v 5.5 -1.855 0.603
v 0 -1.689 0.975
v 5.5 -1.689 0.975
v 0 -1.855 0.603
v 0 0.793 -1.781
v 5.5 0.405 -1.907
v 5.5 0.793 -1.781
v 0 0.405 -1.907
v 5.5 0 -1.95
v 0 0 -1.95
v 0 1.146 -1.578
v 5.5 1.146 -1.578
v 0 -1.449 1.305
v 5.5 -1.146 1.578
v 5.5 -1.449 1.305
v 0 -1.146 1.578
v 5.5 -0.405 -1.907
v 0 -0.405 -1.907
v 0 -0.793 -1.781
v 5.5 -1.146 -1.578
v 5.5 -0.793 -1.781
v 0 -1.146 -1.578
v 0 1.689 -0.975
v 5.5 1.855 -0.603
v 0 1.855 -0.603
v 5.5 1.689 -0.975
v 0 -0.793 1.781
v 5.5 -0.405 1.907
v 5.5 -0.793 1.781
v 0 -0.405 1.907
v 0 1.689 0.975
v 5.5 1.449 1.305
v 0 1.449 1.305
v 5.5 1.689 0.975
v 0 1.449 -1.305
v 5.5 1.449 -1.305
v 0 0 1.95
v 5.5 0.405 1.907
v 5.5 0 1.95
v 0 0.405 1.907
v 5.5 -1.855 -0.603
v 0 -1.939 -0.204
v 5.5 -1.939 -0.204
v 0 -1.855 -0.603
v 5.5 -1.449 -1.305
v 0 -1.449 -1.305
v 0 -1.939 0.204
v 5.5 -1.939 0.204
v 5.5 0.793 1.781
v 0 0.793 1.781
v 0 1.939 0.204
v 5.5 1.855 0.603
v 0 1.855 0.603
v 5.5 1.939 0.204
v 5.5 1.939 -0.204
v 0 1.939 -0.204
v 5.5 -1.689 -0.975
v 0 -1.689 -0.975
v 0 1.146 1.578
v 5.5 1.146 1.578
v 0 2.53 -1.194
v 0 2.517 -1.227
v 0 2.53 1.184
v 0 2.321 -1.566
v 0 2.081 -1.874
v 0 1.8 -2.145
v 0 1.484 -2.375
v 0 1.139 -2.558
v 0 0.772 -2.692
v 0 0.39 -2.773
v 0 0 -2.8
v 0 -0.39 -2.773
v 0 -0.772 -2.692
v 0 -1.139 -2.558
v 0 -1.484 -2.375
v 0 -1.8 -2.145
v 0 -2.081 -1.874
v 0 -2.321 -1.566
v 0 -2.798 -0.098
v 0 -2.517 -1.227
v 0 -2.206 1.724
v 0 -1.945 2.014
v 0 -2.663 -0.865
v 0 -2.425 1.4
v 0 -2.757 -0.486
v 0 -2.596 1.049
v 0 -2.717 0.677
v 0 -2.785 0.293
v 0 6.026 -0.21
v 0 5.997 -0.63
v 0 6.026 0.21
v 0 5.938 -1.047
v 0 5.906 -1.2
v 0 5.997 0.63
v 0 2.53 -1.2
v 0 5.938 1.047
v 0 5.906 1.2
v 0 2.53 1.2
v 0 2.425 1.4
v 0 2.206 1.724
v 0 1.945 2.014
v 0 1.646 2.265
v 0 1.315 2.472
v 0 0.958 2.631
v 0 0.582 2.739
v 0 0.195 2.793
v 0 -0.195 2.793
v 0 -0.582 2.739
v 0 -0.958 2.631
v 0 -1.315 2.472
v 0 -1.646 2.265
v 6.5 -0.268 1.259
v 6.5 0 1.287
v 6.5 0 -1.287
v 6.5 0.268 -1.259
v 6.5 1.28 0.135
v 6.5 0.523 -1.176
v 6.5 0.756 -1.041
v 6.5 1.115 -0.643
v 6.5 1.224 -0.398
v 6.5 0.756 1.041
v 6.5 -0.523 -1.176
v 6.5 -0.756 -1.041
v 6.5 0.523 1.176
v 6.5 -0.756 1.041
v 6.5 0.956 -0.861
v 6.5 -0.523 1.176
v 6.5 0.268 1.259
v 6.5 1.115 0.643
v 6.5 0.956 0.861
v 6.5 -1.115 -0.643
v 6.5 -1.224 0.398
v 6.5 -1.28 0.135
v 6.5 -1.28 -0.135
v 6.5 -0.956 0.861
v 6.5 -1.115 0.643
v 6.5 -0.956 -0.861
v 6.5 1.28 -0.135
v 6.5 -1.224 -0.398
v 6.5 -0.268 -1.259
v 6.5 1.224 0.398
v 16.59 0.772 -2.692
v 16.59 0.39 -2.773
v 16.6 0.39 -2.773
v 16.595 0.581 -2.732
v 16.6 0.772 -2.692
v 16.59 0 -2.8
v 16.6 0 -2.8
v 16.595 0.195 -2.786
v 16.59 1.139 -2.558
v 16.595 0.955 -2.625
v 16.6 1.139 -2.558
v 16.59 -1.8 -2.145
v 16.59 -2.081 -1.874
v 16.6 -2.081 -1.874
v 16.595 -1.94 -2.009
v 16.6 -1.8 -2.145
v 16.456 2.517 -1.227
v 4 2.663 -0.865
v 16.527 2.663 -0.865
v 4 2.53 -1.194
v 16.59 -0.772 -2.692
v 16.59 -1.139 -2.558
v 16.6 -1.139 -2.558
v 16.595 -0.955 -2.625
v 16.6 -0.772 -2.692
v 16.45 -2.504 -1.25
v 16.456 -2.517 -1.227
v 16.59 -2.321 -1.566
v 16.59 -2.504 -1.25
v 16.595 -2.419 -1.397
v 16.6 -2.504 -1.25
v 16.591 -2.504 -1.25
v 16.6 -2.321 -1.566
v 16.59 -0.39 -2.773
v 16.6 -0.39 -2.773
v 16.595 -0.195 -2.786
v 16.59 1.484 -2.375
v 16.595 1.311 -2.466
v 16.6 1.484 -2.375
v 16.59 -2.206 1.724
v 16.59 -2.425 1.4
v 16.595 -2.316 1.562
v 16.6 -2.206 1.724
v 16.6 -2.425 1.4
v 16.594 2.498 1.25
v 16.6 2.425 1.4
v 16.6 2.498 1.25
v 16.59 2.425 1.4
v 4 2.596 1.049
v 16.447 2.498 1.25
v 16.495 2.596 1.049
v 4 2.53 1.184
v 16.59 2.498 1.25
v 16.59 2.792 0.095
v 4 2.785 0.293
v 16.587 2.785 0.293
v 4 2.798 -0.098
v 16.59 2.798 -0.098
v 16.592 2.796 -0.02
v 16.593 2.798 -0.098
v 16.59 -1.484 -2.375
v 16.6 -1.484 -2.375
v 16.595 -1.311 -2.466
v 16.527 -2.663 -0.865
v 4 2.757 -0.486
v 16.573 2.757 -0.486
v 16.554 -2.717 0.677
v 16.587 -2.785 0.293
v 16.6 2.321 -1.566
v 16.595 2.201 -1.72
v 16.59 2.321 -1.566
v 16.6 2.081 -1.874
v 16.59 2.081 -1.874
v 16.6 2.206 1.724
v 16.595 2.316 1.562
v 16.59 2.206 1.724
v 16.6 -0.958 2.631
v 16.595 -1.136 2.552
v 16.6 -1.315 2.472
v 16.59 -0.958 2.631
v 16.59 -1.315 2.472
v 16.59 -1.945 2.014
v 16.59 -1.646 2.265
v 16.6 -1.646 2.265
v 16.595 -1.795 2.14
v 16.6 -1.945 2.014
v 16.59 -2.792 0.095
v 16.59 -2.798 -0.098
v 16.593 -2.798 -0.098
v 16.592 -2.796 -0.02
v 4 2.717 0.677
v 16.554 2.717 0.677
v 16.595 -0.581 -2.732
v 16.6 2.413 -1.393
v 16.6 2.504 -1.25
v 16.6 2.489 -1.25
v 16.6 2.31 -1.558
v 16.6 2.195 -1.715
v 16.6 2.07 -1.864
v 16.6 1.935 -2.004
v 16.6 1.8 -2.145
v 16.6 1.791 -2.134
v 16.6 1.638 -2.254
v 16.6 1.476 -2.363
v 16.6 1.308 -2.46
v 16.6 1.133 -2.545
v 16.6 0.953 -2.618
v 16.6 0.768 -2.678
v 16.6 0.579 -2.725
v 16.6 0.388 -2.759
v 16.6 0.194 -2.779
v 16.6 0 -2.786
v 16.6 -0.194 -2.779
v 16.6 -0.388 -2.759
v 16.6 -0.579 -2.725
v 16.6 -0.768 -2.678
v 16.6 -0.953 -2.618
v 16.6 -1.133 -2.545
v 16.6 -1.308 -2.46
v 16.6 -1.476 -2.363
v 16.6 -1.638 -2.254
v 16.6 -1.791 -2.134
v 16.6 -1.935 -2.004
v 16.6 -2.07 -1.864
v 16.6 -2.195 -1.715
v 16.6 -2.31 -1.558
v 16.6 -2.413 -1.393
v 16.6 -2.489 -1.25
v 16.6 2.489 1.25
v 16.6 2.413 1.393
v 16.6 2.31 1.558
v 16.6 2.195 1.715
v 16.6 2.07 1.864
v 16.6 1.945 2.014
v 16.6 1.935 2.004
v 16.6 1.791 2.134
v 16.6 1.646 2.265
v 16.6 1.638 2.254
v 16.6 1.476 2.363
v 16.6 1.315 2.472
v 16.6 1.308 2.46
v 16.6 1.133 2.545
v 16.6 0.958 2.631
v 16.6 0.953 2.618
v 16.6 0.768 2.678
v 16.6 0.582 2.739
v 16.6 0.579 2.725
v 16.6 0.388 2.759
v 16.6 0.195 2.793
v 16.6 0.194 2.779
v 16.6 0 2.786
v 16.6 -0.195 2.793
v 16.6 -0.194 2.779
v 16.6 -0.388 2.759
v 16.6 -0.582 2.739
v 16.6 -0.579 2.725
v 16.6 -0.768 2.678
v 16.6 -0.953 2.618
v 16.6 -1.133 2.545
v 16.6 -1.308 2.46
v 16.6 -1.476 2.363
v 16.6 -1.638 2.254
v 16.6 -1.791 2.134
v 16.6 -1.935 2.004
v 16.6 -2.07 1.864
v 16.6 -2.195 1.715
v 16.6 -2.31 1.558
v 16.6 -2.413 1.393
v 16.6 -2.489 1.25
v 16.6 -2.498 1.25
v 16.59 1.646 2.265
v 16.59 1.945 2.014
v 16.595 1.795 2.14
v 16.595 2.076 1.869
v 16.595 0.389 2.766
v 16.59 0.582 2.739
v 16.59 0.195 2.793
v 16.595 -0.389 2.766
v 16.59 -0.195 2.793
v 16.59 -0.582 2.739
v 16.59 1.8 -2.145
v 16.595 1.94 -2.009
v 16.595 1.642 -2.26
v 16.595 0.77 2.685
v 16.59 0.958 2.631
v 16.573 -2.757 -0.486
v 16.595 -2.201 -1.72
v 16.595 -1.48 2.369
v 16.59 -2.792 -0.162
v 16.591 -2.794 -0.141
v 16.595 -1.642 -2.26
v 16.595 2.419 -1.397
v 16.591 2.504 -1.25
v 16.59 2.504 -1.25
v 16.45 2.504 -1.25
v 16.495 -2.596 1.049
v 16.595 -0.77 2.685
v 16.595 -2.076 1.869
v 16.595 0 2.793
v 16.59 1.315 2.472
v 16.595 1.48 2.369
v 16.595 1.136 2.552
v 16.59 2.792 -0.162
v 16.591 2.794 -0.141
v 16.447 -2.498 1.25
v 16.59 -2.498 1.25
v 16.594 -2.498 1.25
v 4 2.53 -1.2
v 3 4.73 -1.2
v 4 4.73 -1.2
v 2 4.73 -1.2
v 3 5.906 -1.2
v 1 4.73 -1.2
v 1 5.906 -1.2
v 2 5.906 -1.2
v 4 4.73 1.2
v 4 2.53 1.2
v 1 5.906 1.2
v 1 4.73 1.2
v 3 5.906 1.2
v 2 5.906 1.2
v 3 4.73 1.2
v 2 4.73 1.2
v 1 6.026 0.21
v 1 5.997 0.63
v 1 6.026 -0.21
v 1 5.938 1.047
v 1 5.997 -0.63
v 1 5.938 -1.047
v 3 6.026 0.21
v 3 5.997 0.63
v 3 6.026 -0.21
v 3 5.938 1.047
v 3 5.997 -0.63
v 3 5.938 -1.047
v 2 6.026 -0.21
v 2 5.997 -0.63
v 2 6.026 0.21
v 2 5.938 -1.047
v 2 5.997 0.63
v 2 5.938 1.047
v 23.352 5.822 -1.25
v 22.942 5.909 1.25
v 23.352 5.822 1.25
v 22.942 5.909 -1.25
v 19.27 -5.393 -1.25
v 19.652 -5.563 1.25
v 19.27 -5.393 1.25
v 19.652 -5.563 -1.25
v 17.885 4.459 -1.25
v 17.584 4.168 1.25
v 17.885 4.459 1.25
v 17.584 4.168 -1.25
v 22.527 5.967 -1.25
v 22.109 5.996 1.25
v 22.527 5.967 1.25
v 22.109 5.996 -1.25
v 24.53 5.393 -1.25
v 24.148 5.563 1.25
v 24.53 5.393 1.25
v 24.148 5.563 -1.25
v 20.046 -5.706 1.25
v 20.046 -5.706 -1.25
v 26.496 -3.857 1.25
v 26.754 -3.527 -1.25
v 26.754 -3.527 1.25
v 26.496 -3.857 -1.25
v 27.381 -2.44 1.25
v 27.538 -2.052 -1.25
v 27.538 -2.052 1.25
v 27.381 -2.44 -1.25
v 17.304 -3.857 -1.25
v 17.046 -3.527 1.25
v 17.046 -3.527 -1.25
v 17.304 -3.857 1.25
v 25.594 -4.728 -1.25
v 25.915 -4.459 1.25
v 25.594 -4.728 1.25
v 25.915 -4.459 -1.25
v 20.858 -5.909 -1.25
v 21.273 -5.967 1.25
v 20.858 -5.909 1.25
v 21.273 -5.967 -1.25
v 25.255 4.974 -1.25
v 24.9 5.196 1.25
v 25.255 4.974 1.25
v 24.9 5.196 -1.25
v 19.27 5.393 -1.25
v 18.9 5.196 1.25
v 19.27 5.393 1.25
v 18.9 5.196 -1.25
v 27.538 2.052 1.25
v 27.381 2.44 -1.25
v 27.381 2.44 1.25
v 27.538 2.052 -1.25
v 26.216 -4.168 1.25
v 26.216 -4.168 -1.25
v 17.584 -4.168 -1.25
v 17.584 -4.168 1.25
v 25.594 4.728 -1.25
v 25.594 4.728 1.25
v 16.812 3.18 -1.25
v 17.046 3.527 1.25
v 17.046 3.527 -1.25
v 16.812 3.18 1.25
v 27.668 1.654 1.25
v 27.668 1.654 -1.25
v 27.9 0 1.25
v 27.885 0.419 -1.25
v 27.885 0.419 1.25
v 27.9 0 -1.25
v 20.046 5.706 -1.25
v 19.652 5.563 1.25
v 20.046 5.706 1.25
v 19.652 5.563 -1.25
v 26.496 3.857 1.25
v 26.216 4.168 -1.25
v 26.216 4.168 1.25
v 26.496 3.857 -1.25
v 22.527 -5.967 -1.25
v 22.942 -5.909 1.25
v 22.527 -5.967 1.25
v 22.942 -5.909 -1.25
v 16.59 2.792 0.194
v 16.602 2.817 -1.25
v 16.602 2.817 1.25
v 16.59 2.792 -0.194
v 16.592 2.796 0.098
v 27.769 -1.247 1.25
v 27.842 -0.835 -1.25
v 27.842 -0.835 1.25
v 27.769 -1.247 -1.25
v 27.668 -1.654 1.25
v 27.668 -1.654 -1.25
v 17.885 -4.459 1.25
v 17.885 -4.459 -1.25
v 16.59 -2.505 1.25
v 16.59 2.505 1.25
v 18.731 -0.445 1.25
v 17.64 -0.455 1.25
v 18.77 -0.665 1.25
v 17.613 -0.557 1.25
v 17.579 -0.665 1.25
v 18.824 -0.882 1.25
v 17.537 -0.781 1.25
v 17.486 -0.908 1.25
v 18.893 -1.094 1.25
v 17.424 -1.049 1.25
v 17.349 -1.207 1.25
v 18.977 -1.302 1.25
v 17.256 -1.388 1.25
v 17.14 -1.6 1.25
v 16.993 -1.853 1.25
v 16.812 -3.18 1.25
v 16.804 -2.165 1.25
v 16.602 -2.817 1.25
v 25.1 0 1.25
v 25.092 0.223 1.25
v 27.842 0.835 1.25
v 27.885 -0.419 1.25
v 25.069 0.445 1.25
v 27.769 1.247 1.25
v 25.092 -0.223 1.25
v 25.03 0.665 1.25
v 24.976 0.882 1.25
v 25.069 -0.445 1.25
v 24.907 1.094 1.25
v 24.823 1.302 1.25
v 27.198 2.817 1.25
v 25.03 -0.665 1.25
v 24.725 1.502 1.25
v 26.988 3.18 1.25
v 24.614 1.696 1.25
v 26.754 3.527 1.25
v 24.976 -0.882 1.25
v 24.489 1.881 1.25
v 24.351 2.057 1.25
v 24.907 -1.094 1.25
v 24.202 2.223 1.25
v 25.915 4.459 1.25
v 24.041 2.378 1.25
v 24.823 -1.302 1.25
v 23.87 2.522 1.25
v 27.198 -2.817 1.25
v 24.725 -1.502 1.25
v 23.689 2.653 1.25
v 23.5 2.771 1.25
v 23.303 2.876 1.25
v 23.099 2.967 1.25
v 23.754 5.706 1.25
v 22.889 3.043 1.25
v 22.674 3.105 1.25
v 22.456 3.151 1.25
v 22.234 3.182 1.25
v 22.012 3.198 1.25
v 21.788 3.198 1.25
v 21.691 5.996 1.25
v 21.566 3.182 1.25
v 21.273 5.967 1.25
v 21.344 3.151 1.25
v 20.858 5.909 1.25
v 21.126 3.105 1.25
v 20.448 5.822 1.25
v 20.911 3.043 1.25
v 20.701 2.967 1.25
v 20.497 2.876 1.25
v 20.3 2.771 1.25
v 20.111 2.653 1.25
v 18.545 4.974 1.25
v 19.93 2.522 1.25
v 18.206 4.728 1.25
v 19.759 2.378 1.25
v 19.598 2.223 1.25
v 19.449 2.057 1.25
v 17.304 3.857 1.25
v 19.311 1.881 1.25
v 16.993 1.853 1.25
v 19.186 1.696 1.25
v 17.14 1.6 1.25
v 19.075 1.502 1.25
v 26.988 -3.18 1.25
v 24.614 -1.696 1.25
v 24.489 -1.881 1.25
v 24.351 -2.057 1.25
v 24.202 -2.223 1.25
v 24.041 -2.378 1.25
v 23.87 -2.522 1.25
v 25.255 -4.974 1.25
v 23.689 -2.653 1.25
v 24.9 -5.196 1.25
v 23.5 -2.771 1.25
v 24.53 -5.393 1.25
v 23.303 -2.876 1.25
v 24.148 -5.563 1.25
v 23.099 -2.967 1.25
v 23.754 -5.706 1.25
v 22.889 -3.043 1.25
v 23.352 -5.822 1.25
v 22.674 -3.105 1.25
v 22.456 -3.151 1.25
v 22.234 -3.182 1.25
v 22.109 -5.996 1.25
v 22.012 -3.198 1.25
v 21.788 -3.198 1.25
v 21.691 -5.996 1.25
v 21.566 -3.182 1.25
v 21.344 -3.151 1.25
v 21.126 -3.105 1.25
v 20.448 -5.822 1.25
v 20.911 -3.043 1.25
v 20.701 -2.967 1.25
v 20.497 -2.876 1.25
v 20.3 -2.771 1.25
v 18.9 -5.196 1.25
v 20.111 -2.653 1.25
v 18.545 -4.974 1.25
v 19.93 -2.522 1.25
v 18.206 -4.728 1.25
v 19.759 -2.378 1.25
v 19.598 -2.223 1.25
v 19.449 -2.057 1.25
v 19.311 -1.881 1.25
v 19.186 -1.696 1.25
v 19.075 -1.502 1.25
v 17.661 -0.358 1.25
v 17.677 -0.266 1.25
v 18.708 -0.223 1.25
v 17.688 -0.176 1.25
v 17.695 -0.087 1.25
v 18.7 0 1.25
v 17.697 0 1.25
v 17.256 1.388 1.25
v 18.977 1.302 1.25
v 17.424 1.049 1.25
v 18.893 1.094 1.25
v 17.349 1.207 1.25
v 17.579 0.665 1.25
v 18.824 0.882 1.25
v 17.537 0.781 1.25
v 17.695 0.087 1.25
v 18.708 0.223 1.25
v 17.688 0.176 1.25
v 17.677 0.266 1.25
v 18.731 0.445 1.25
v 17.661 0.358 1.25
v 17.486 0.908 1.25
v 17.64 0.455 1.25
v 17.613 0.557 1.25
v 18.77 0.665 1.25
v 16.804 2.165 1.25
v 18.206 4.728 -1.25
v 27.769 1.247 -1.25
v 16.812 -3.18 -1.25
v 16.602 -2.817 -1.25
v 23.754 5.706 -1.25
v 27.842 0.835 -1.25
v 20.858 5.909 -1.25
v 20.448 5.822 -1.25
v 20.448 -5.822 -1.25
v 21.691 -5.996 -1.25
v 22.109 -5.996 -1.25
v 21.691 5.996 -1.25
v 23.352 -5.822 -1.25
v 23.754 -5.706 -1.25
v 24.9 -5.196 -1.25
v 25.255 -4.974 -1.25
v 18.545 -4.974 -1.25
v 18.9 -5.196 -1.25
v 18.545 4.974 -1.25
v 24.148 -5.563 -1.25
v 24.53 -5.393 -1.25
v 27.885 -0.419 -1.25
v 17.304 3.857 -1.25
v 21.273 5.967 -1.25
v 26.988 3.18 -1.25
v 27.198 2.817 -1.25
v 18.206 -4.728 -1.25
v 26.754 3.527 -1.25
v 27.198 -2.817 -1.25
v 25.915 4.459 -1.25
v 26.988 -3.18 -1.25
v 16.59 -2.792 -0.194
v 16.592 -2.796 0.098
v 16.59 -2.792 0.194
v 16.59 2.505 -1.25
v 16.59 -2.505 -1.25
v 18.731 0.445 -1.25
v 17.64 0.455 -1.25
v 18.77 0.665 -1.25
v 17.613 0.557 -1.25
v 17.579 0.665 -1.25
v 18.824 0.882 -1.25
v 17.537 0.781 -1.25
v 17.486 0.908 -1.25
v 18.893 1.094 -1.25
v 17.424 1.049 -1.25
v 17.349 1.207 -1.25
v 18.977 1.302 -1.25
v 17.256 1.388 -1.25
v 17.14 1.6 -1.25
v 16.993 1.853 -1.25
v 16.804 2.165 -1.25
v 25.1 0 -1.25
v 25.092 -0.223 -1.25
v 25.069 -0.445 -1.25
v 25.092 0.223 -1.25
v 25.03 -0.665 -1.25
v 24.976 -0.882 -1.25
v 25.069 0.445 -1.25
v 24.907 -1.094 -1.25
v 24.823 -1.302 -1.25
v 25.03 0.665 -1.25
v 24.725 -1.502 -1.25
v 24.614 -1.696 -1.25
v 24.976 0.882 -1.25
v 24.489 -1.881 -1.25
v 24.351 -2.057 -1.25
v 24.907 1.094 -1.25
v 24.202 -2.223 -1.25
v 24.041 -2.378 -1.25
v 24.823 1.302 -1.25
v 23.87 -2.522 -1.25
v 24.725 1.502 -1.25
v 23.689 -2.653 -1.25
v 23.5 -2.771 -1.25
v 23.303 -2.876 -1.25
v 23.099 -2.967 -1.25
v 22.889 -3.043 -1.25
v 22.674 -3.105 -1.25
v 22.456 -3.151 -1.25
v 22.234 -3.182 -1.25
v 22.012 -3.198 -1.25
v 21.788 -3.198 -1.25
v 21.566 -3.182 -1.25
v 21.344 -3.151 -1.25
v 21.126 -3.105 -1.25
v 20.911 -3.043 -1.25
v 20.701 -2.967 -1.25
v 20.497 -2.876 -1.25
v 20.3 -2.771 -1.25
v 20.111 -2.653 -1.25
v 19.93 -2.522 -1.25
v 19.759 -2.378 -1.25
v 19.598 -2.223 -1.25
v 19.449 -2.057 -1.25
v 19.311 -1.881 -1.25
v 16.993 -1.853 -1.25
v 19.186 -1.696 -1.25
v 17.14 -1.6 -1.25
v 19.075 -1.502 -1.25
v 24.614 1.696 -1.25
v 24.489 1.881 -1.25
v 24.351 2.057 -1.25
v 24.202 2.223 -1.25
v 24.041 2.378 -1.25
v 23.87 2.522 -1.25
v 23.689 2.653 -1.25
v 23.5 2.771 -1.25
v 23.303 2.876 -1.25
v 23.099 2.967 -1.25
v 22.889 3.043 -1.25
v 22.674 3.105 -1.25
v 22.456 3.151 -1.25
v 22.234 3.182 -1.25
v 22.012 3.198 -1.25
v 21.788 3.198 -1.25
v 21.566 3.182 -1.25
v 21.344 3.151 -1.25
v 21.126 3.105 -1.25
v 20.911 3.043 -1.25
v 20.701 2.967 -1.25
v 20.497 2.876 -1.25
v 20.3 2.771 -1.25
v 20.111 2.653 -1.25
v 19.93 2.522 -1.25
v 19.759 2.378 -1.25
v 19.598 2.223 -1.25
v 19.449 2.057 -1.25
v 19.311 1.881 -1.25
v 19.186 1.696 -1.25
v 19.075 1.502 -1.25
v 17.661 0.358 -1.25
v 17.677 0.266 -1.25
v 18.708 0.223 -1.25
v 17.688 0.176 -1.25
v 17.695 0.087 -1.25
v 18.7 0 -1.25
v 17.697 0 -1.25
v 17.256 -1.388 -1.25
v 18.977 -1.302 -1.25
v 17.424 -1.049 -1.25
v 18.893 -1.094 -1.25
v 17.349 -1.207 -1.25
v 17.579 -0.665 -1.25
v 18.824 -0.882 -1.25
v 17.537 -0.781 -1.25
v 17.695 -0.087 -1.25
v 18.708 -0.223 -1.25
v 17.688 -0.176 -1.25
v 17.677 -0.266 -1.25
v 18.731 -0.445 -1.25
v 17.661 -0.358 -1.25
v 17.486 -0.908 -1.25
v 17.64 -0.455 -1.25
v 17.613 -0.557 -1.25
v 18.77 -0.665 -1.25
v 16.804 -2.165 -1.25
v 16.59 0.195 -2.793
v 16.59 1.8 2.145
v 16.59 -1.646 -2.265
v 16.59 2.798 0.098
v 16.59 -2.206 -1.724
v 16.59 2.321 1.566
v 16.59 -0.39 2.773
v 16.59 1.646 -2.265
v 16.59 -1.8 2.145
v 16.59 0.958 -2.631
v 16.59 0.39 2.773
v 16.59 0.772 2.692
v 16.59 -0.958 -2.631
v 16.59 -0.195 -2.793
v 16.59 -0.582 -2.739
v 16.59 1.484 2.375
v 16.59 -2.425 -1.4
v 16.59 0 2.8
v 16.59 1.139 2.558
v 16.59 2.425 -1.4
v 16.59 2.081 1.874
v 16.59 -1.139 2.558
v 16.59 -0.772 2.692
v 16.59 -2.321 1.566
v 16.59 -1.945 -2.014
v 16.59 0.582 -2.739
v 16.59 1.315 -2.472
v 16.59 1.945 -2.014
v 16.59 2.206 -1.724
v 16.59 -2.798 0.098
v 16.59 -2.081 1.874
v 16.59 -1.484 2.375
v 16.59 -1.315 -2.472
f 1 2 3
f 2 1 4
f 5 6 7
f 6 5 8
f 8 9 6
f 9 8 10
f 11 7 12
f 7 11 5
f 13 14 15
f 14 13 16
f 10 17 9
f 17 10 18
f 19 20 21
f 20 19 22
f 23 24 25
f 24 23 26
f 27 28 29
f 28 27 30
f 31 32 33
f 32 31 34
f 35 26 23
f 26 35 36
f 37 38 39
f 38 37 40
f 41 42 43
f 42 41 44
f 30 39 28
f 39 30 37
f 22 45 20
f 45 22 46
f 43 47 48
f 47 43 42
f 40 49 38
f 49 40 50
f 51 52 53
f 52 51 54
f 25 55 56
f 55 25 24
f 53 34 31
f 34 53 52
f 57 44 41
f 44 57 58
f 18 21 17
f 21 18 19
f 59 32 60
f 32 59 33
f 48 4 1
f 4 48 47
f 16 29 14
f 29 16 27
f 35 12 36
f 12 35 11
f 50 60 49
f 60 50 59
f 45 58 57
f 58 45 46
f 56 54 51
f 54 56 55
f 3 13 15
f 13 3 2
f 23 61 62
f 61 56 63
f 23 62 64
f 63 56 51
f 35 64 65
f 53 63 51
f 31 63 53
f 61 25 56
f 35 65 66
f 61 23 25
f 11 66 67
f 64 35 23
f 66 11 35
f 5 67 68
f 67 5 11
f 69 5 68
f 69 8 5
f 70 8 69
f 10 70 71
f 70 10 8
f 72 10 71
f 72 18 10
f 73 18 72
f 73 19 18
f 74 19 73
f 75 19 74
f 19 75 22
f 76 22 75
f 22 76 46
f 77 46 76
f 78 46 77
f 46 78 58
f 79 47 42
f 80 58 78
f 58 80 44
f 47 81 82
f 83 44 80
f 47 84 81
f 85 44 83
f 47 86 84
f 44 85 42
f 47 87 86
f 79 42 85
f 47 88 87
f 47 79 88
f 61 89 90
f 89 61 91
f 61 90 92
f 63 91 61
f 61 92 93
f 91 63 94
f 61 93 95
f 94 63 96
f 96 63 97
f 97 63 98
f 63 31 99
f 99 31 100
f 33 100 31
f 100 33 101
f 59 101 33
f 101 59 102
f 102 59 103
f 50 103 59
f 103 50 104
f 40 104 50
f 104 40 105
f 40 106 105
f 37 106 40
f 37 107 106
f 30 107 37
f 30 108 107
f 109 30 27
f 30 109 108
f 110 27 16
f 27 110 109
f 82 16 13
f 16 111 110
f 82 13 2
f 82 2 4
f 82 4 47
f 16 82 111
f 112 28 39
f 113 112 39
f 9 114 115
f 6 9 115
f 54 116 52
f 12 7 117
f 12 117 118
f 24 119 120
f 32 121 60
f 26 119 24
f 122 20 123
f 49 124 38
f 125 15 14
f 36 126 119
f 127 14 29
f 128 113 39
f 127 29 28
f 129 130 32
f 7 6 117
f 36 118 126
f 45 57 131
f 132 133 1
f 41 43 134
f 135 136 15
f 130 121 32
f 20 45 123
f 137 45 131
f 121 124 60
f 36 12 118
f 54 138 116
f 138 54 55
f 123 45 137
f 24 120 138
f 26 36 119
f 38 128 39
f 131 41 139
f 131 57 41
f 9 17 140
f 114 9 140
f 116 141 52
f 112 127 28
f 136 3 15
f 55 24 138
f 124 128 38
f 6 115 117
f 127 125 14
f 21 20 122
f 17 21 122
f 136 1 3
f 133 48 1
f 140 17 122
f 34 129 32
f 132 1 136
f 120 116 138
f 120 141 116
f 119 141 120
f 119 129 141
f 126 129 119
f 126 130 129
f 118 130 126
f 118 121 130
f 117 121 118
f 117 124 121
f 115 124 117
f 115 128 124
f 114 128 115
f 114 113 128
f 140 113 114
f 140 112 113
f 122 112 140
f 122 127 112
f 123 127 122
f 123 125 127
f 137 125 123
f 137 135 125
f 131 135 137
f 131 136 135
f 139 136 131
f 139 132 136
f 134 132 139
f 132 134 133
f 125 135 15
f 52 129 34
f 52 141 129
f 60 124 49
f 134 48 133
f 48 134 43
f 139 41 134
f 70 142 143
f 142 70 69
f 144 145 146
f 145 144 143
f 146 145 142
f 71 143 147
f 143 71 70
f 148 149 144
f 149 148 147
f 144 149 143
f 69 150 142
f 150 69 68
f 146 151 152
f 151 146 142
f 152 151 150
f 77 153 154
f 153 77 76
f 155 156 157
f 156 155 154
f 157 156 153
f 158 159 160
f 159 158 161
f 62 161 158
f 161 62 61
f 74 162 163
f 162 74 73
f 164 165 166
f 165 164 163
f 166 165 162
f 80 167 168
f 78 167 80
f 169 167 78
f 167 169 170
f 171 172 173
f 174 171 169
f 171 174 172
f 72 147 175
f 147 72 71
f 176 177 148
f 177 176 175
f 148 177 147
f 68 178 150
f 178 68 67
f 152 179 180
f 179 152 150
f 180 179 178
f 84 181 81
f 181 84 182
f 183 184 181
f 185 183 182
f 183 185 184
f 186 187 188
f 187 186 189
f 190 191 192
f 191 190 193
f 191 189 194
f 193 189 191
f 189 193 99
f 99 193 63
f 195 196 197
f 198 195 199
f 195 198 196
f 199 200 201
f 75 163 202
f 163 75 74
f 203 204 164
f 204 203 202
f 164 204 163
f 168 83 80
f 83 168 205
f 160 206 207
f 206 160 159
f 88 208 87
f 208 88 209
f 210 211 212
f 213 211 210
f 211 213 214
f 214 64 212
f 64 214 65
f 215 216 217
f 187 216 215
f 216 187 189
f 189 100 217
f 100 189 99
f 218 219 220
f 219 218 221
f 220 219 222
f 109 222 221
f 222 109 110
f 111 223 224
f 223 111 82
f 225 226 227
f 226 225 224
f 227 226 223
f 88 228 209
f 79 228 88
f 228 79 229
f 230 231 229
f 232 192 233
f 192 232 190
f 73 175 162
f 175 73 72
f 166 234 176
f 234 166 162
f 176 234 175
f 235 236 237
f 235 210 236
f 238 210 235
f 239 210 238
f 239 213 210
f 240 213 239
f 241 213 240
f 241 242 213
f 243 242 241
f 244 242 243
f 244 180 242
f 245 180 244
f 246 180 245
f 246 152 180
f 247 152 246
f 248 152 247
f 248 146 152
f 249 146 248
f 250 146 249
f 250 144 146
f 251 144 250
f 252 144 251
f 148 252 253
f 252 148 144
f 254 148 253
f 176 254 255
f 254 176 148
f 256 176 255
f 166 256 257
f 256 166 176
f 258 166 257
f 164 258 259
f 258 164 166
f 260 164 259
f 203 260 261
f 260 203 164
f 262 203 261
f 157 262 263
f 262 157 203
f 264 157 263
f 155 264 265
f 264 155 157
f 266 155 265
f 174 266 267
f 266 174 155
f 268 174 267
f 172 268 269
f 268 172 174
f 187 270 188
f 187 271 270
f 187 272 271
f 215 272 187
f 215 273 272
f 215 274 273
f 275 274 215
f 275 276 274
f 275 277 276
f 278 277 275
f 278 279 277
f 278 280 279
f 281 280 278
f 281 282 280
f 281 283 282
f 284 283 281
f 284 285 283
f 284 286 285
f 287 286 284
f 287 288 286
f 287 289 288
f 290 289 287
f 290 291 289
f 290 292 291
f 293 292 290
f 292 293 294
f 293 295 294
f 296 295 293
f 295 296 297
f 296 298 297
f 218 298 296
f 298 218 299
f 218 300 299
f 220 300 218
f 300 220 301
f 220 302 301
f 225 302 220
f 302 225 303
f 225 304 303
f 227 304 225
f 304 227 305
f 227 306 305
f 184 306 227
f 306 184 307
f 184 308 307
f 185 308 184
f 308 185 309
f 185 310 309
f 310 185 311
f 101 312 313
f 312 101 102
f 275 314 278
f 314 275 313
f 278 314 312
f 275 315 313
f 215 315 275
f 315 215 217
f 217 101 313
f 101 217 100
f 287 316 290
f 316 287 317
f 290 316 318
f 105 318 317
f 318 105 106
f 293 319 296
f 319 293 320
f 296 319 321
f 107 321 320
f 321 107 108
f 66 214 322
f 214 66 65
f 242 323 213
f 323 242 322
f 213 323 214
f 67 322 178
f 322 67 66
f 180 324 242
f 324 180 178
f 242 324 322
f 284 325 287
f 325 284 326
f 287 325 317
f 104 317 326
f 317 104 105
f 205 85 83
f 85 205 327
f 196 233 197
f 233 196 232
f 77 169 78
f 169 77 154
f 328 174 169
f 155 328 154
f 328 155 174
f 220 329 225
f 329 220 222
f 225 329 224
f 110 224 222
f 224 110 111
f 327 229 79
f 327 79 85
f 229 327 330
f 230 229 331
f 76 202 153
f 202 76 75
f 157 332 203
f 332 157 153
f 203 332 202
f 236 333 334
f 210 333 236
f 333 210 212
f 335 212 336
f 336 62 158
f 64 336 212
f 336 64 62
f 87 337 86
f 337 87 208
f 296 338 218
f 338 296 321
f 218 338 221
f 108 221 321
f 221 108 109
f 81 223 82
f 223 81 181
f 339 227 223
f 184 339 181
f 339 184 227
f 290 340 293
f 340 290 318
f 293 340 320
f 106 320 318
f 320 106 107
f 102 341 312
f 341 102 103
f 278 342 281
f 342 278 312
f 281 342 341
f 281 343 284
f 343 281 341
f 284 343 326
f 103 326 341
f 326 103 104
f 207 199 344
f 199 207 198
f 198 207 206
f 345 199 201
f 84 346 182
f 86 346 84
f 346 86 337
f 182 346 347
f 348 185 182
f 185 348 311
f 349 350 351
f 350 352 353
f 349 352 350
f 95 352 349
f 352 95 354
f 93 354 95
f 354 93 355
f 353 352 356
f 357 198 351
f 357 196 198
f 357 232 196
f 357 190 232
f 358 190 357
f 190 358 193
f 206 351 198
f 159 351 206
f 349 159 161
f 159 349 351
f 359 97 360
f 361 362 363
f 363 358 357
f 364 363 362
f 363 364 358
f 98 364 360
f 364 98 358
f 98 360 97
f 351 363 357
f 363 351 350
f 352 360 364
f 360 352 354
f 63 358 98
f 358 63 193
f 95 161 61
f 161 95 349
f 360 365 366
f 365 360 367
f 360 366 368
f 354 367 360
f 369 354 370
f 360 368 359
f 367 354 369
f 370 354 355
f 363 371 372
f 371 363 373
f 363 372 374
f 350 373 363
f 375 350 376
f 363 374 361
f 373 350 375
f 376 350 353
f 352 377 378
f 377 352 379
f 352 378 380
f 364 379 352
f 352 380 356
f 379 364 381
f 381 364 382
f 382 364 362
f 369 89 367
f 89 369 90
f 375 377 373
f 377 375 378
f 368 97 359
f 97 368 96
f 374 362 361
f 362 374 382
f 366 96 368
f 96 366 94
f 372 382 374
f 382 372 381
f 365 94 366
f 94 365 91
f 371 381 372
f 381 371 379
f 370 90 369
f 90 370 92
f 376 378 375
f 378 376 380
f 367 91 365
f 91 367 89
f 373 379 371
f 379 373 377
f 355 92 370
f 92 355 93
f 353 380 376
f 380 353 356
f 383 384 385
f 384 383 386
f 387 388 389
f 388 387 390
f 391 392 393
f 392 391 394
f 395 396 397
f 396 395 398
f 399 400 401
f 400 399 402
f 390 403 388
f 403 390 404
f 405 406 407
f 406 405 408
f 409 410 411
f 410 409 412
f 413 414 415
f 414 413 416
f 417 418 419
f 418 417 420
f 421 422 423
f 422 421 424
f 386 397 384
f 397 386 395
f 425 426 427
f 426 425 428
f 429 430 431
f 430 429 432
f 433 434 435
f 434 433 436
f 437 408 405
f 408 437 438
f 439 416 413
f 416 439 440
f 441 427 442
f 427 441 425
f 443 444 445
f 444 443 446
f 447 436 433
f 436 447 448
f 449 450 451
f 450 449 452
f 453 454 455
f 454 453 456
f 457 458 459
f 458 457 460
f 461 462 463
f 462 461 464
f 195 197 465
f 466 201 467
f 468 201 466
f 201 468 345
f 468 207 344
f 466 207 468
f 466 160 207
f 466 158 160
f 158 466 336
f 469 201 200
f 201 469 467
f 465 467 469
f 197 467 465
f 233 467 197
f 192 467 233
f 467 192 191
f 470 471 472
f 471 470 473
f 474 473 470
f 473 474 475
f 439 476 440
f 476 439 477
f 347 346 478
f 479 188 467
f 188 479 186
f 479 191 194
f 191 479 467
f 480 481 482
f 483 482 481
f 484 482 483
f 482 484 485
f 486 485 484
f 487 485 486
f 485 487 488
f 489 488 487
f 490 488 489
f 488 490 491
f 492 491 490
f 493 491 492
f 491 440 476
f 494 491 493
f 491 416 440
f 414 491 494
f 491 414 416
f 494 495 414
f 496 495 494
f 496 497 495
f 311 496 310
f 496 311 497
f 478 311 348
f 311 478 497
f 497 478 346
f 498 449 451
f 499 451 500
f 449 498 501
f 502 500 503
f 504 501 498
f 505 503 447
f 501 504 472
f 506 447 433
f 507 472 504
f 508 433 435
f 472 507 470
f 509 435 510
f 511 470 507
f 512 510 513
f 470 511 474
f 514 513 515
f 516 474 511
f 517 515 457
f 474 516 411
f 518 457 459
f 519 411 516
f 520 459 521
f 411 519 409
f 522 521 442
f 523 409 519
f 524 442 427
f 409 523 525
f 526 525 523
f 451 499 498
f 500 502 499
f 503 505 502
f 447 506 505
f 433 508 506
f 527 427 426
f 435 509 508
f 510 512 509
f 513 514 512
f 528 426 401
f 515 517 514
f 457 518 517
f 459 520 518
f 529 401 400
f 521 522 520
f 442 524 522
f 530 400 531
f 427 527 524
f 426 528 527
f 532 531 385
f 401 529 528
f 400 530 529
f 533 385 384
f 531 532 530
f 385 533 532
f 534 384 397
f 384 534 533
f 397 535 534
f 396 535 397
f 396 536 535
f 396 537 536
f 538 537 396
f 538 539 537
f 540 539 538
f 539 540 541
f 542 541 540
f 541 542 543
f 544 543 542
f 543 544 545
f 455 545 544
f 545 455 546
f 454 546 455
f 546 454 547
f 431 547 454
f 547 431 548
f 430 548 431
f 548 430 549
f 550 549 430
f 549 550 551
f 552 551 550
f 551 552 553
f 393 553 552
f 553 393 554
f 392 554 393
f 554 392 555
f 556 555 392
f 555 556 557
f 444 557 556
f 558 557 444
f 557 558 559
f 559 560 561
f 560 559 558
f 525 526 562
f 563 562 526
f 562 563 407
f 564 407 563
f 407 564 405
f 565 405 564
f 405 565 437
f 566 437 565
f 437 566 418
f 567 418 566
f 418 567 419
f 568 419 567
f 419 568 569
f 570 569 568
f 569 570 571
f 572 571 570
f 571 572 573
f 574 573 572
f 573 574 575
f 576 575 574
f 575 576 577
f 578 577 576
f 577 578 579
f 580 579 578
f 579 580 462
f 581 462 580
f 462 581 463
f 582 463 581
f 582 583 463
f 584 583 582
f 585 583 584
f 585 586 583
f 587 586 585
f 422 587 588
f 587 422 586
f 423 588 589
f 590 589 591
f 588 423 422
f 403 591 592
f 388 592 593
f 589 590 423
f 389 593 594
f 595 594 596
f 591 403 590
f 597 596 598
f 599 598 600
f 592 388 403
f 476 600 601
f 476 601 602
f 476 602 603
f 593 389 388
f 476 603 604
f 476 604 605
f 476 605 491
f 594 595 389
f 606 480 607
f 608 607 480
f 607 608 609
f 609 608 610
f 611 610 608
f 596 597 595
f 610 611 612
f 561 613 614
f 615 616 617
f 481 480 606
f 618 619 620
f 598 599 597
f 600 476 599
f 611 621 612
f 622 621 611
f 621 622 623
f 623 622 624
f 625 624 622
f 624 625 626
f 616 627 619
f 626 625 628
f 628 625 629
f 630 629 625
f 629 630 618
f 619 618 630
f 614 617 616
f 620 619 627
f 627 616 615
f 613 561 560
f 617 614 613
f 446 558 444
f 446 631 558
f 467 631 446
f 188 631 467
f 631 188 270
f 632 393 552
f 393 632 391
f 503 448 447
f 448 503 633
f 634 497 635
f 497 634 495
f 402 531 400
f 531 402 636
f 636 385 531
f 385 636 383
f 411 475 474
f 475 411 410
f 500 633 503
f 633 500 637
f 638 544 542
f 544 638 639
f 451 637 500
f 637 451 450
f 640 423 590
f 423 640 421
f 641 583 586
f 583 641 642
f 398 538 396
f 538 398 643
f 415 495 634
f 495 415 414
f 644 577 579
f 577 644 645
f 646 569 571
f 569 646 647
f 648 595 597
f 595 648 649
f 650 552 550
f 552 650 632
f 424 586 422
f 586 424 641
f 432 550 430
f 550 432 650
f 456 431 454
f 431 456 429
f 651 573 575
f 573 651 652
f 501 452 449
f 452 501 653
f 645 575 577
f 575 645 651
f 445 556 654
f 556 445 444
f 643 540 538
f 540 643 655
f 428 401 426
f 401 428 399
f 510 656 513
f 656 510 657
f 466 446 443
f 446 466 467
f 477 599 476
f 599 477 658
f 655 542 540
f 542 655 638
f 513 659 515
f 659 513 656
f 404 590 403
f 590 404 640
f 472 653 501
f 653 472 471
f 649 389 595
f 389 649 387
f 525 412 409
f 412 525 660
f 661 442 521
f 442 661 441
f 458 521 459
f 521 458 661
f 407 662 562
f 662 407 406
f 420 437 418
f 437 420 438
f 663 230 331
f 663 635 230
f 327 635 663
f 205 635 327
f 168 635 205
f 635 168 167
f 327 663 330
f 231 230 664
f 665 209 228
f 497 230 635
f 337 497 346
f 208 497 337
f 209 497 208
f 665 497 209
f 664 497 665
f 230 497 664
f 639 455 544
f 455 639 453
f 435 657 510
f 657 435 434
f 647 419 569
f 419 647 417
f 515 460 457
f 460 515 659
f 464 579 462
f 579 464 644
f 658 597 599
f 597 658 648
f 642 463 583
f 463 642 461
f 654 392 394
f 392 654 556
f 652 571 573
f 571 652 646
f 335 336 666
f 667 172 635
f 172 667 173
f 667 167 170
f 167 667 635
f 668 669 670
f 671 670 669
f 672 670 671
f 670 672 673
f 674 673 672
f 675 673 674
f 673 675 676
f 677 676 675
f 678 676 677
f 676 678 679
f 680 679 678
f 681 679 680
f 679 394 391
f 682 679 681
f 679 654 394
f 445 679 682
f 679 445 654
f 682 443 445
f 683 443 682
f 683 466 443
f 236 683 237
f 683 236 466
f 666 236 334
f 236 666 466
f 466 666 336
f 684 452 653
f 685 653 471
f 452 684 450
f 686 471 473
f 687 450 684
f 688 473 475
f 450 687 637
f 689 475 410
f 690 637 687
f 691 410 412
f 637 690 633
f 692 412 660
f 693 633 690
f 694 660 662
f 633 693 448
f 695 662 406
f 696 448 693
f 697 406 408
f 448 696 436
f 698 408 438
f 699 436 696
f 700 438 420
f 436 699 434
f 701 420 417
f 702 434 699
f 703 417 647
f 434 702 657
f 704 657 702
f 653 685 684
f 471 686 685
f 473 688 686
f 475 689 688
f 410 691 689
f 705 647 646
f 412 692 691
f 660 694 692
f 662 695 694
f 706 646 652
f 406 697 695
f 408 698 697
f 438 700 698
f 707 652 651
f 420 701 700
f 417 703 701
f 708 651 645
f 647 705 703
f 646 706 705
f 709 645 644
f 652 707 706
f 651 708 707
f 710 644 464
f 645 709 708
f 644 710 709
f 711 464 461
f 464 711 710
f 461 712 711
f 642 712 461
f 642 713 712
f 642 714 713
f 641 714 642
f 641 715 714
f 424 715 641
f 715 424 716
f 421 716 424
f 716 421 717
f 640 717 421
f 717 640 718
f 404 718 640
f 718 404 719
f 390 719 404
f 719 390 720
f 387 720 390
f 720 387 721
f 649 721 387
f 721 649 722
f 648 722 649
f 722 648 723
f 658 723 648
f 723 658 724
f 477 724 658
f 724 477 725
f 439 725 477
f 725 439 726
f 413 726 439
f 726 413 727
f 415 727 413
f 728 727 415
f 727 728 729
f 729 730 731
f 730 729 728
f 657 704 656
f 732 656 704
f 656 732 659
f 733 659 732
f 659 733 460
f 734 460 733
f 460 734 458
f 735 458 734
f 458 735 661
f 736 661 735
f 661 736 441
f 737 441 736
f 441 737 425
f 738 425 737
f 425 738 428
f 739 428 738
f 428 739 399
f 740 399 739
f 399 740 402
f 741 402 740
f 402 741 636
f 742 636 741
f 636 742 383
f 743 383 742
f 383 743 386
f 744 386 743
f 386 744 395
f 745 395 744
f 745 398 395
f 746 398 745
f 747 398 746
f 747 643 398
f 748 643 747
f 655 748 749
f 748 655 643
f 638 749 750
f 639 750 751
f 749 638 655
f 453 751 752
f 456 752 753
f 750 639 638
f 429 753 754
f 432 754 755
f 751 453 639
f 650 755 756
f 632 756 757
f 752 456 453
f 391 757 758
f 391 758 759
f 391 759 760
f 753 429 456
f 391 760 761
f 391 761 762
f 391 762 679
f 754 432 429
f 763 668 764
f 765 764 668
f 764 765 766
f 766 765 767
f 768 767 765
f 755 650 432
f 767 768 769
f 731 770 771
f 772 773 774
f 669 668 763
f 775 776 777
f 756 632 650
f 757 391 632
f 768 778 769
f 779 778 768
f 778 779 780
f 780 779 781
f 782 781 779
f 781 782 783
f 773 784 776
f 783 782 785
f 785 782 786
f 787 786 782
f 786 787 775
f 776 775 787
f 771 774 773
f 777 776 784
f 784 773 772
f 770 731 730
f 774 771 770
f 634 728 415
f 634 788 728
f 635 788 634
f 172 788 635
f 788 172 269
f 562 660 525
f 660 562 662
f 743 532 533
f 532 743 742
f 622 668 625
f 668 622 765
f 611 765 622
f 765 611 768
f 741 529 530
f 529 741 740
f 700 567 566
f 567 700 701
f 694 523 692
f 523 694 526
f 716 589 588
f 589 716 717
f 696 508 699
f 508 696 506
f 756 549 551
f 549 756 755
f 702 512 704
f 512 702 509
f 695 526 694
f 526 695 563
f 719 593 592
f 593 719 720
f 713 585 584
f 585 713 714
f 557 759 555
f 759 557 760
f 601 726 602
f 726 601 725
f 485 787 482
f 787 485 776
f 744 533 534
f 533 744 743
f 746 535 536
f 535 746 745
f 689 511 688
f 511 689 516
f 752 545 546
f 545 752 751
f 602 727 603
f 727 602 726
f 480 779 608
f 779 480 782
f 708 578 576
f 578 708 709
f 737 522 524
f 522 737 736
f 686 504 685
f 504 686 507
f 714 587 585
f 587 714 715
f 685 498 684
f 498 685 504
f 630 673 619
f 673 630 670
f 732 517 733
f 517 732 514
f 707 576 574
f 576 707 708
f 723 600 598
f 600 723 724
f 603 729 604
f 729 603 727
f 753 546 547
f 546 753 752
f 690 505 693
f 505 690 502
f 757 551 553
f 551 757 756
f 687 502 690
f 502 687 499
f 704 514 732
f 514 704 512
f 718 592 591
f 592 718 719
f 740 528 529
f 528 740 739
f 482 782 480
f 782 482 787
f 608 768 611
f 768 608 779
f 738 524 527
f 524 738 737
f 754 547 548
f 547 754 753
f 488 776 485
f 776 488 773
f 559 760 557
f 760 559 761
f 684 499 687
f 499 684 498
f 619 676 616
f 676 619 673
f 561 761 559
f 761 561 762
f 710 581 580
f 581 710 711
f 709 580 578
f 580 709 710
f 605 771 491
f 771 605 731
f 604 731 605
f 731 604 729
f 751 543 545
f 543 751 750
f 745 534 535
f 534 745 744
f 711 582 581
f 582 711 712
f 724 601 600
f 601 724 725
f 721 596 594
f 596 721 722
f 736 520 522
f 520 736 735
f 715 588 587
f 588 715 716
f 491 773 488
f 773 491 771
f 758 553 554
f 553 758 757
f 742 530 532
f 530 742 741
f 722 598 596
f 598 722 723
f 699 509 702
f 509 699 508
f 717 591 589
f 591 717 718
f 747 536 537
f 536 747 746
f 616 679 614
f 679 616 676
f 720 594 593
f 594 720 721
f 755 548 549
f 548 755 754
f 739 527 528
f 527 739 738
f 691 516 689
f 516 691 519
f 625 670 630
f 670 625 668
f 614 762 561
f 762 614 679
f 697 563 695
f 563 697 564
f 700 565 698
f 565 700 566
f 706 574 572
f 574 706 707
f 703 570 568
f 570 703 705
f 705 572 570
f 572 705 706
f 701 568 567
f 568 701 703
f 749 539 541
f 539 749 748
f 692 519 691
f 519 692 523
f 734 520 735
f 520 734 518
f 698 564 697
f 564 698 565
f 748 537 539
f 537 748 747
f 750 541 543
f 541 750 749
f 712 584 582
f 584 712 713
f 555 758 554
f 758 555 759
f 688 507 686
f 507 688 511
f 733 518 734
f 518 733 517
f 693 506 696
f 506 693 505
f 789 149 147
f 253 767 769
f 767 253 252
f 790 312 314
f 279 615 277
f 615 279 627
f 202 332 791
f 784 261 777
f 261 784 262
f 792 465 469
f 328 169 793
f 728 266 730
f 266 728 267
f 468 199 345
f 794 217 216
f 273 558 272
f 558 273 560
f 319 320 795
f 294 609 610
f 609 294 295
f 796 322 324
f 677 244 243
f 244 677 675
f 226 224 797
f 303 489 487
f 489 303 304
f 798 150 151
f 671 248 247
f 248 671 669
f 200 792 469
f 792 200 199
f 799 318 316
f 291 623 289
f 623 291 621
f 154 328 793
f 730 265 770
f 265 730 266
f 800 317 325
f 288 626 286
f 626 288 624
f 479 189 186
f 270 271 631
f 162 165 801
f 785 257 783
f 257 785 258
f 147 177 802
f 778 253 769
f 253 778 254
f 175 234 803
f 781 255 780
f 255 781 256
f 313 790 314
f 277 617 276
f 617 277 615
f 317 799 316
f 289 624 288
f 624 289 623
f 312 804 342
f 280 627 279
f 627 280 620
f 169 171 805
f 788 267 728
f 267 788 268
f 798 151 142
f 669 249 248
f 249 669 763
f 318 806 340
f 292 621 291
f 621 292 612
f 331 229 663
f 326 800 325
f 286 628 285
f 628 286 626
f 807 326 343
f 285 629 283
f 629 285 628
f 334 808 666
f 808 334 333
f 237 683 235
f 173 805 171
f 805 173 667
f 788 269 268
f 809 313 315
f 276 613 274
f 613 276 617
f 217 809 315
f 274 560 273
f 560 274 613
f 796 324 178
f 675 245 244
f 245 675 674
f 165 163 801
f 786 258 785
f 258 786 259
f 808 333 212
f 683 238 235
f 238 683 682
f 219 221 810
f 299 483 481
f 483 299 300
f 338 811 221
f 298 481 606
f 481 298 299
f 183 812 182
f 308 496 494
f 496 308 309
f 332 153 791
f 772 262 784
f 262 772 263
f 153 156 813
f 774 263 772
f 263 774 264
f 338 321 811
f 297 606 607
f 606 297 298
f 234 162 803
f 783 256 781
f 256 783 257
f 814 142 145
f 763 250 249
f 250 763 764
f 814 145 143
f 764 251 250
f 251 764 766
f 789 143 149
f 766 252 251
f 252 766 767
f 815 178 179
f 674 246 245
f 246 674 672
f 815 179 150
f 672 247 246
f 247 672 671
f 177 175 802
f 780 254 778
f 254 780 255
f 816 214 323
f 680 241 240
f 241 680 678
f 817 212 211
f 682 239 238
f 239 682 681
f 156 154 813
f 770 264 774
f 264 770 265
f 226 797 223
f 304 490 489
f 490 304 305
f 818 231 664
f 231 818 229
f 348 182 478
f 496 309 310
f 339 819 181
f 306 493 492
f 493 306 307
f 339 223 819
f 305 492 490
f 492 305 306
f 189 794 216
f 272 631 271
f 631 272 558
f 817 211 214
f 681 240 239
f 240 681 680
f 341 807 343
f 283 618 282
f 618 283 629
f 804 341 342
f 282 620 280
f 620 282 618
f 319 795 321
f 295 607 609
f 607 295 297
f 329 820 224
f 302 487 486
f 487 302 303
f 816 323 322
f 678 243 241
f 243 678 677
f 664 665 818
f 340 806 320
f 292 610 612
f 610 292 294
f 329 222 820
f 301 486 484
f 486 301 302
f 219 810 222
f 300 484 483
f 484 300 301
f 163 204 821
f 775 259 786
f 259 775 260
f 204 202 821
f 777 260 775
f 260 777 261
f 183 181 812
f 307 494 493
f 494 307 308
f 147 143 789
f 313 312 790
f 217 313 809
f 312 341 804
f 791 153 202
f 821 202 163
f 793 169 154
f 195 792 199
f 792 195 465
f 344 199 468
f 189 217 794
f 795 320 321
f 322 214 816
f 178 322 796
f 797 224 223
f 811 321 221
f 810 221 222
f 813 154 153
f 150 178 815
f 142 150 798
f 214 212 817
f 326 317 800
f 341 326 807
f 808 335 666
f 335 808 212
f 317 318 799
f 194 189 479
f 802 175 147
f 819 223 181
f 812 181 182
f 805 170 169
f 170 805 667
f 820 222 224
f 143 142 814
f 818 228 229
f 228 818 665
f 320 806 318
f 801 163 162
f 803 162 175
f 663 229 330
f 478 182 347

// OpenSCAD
stem_height = 16.6;
stem_r = 2.8;
hole_height = 6.5;
hole_r = 1.95;

teeth_height = 4;
tooth_width = 2.4;
tooth_height = 1;
base_depth = 2.2;
tooth_depth = 3.5;
tooth_gap = 1;

// Offset from the center of the stem
teeth_offset = 2.53 * 1;

rotate([0,90,0])
union() {
  difference() {
    stem();
    hole();
  }
  rounded_teeth();
  handle();
}

module stem() {
  $fn = 45;
  cylinder(r=stem_r, h=stem_height);
}

module hole() {
  $fn = 30;
  union() {
    cylinder(r=hole_r, h=hole_height-1);
    translate([0, 0, hole_height-1])
      cylinder(r1=hole_r, r2=hole_r*0.66, h=1);
  }
}

module rounded_teeth() {
  $fn = 90;
  intersection() {
    teeth();
    cylinder(r=teeth_offset+tooth_depth, h=teeth_height);
  }
}

module teeth() {
  translate([-tooth_width/2, teeth_offset, 0])
  union() {
    cube([tooth_width, base_depth, teeth_height]);
    cube([tooth_width, tooth_depth, tooth_height]);
    translate([0, 0, tooth_height+tooth_gap])
      cube([tooth_width, tooth_depth, tooth_height]);
  }
}

module handle() {
  $fn = 90;

  union() {
    translate([0, 0, stem_height+5.3])
      rotate([0, 90, 0])
      difference() {
        cylinder(r=6, h=2.5, center=true);
        cylinder(r=3.2, h=2.5, center=true);
      }
    translate([0, 0, stem_height-0.01])
      cylinder(r1=stem_r, r2=0, h=2);
  }
}

module original() {
  rotate([0,0,180])
    translate([0,0,11.68])
    import("Original.stl", convexity=10);
}
